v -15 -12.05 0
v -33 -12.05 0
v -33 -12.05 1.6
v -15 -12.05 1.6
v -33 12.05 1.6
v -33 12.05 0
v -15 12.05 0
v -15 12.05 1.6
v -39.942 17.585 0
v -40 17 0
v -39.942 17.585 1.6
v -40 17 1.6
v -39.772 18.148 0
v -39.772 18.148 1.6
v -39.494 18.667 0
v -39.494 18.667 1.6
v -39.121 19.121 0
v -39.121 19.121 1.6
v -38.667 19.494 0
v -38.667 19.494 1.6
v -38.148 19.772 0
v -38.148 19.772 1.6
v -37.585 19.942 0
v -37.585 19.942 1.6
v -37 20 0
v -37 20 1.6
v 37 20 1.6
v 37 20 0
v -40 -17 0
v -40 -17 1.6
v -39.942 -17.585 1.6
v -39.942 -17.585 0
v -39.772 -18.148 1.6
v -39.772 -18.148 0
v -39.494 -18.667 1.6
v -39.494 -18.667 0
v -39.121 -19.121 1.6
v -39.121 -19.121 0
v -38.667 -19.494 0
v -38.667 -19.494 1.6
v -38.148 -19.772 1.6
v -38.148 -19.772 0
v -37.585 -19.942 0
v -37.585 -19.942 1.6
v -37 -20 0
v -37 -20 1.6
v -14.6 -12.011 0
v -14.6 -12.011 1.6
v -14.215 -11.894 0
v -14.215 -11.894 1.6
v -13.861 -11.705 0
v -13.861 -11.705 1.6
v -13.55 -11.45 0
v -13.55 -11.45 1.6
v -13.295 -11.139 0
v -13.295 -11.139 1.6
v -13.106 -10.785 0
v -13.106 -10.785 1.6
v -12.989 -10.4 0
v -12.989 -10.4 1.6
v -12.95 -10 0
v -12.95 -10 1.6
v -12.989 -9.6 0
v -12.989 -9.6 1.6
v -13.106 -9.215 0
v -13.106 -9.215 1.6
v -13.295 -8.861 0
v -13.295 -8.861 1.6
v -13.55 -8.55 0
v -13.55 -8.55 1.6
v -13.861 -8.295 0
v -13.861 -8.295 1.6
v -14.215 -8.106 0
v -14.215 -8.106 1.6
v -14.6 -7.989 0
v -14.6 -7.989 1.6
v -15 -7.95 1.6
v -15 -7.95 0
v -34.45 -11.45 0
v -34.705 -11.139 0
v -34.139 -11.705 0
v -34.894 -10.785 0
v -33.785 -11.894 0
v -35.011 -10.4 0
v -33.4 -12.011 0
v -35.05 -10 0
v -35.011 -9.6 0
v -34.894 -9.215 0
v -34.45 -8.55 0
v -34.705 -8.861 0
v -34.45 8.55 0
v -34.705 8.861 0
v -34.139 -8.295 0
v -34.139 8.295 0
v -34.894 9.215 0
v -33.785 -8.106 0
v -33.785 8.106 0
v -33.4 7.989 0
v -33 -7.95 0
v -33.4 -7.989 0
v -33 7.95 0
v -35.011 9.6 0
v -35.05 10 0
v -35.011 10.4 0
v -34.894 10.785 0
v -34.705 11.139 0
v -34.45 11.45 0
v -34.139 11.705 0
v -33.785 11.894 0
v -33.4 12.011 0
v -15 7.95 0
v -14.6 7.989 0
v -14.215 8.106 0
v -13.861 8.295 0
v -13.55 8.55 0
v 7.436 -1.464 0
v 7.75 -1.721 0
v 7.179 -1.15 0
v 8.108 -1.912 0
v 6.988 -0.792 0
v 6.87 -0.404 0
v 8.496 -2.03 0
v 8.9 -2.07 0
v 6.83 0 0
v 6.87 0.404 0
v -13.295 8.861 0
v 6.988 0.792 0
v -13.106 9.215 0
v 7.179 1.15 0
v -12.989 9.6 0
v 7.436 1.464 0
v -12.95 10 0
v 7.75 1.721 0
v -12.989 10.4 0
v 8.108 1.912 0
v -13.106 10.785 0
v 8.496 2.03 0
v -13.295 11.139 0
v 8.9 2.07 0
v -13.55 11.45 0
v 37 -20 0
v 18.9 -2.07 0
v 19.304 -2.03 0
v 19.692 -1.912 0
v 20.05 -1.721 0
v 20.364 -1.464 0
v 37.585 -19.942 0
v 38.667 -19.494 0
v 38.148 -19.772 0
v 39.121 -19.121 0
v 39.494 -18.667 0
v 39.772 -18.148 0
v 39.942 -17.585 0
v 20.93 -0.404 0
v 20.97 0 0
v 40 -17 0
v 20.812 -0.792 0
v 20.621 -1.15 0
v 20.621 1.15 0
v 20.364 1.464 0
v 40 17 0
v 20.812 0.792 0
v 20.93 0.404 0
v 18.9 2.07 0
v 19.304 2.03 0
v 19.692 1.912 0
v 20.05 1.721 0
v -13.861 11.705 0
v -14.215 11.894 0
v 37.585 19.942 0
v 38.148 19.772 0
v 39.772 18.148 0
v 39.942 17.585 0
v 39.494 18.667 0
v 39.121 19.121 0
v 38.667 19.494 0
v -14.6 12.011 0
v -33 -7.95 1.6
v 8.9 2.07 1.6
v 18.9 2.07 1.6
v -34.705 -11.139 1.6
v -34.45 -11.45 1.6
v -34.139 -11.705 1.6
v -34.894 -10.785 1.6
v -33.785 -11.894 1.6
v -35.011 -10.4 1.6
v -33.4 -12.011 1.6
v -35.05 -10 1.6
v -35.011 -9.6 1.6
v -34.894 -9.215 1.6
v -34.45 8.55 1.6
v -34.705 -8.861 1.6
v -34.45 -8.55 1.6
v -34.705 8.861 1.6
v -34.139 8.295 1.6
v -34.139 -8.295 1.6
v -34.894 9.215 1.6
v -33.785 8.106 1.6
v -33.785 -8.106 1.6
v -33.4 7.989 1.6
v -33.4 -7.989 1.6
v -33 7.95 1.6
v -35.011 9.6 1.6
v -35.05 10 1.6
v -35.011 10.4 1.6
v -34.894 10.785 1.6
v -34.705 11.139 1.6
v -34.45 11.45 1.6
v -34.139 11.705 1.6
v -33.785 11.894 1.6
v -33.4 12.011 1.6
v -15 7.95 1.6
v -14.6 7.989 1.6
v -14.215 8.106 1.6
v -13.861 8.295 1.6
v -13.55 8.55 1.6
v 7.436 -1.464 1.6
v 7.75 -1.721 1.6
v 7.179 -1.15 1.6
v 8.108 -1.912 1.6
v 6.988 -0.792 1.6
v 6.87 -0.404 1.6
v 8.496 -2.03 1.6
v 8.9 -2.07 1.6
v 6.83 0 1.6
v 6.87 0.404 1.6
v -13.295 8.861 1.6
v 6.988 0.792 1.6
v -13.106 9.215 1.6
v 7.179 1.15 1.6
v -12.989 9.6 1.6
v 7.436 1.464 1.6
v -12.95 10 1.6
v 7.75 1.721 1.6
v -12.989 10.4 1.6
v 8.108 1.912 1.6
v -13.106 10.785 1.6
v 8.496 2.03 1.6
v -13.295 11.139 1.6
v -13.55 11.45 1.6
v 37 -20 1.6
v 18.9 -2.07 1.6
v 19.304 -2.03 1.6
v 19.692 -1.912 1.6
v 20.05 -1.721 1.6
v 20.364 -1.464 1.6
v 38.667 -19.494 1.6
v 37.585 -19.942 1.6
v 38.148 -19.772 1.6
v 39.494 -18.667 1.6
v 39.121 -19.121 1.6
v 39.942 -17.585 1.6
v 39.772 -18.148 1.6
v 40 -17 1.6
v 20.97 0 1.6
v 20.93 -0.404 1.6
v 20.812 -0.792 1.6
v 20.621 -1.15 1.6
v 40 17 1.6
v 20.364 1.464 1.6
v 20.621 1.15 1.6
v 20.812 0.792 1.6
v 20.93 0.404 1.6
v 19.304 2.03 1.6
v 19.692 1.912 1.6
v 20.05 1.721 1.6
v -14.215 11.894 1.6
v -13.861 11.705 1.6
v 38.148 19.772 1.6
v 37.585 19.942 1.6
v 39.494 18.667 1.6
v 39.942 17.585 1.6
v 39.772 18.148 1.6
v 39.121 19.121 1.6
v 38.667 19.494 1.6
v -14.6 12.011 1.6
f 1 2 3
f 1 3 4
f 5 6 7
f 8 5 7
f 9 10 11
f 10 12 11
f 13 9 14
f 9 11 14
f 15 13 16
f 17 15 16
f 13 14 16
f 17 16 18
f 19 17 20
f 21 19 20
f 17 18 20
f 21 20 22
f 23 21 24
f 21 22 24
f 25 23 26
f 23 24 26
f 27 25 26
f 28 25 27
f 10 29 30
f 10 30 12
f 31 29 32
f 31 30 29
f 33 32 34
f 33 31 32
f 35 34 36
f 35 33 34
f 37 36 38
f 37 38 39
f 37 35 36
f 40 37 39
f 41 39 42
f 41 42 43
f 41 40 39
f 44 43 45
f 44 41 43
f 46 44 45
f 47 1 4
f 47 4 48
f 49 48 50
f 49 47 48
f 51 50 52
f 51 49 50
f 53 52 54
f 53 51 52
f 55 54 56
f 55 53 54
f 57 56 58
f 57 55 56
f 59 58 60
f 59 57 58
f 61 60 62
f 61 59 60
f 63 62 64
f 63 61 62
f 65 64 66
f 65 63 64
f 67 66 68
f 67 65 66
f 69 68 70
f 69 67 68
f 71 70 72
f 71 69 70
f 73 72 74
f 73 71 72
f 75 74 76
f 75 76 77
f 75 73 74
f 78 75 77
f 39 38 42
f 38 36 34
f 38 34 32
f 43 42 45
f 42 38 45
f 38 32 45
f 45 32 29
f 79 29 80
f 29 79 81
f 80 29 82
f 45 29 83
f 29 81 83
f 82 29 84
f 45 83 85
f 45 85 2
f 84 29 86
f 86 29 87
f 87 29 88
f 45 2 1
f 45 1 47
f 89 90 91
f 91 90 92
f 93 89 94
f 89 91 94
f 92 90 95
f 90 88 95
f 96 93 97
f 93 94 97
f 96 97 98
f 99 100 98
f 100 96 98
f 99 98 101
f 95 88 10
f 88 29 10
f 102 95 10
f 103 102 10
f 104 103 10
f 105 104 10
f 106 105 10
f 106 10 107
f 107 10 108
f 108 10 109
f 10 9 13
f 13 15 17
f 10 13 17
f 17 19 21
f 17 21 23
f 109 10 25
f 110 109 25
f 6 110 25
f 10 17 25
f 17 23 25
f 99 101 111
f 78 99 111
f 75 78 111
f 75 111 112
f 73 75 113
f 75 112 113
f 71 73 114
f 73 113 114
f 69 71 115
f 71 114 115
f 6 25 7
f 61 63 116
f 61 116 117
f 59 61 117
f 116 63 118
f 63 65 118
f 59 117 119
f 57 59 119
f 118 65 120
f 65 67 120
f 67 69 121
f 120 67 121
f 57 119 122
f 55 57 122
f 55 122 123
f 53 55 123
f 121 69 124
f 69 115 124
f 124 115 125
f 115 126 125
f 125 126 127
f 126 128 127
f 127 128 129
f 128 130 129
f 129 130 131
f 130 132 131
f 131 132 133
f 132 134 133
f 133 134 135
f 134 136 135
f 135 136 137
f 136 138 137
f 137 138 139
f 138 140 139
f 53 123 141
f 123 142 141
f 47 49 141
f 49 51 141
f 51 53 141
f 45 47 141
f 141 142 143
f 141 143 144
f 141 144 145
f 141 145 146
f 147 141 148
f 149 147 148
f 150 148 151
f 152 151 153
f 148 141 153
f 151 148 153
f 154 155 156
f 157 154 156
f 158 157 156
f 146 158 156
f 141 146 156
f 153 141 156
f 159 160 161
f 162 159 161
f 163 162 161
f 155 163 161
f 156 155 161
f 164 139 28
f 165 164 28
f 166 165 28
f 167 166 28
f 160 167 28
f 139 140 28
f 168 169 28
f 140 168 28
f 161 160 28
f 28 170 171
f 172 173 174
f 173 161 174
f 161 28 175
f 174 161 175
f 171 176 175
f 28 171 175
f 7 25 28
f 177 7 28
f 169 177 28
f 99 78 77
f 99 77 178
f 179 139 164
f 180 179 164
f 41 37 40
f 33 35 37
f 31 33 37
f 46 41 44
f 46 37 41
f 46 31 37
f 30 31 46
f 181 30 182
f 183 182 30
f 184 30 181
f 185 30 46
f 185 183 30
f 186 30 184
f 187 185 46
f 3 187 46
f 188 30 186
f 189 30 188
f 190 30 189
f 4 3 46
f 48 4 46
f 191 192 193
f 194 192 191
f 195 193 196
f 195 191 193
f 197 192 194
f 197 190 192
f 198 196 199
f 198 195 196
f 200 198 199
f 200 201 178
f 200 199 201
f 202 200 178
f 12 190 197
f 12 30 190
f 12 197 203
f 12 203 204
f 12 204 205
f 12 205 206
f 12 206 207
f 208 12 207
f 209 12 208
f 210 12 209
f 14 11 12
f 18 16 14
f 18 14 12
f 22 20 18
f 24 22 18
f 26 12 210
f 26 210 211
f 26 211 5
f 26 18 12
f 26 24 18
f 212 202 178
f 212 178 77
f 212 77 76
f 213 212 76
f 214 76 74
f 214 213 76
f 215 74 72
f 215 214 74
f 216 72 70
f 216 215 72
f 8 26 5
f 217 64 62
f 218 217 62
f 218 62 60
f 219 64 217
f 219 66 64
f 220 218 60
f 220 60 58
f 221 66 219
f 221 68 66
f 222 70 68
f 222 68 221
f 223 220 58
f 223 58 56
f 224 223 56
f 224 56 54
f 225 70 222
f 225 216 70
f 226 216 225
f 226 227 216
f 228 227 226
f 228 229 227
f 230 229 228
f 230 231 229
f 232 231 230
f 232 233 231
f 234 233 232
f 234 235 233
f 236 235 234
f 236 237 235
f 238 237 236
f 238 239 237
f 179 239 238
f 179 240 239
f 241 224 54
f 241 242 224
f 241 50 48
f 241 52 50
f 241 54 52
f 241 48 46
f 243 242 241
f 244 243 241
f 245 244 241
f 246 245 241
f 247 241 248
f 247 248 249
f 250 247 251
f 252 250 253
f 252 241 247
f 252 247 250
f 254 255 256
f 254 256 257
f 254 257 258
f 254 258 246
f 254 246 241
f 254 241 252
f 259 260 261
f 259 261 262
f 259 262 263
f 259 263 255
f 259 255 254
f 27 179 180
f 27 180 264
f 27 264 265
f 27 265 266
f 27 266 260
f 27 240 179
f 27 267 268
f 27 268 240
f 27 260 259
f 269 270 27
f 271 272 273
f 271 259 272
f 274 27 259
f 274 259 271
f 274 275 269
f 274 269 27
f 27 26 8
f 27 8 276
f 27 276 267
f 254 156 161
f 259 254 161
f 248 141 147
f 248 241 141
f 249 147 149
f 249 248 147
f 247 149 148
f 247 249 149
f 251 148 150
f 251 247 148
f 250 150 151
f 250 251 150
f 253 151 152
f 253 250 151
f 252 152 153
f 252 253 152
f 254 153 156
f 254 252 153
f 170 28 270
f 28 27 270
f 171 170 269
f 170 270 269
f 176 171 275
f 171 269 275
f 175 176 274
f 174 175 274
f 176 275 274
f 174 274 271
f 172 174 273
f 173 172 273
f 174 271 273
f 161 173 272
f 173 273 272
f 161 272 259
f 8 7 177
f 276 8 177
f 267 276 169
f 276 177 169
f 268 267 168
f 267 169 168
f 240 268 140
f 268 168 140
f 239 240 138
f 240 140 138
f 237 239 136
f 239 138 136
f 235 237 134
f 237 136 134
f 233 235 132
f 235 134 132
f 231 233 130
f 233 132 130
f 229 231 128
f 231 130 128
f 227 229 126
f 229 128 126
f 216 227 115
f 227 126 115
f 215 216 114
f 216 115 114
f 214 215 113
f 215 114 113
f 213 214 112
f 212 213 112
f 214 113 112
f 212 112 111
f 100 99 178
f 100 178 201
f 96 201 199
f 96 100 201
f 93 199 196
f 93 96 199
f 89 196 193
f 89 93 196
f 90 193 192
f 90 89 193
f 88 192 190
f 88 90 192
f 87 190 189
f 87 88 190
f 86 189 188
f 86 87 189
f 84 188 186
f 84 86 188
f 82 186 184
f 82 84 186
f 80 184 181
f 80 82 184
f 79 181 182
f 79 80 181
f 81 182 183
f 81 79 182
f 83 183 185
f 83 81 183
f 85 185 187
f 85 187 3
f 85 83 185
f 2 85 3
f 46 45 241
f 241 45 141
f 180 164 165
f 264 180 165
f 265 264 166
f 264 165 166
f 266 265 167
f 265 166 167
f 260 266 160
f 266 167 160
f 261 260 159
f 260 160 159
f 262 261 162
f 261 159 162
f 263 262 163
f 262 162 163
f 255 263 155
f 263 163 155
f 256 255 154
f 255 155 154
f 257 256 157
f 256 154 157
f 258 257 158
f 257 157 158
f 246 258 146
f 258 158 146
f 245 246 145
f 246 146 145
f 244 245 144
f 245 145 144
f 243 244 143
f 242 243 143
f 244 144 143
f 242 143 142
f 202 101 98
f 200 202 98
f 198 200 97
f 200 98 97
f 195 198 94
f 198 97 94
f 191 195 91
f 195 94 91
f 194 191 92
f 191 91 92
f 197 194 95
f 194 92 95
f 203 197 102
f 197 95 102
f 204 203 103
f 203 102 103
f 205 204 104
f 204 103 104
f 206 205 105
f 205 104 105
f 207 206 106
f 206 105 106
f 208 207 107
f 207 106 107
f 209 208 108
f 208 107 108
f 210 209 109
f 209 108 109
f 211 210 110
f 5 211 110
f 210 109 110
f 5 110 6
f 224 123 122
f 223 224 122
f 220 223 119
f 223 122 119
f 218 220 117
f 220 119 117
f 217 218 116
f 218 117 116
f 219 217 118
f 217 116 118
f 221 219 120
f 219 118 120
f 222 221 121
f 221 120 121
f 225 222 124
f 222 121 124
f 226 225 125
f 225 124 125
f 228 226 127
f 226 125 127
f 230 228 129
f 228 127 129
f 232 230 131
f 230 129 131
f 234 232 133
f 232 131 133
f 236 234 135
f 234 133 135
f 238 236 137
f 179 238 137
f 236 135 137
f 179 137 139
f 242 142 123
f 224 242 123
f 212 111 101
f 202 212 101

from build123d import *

# Parameters (mm, degrees)
SKETCH1_W           = 80
SKETCH1_H           = 40
BOSS_EXTRUDE1_DEPTH = 1.6
FILLET1_R           = 3


with BuildPart() as part:
    # Sketch1 → Boss-Extrude1 (new body)
    with BuildSketch(Plane.XY):
        Rectangle(SKETCH1_W, SKETCH1_H)
        with BuildLine():
            Line((-15, 7.95), (-33, 7.95))
            ThreePointArc((-33, 7.95), (-35.05, 10), (-33, 12.05))
            Line((-33, 12.05), (-15, 12.05))
            ThreePointArc((-15, 12.05), (-12.95, 10), (-15, 7.95))
        make_face(mode=Mode.SUBTRACT)
        with BuildLine():
            Line((-15, -7.95), (-33, -7.95))
            ThreePointArc((-33, -7.95), (-35.05, -10), (-33, -12.05))
            Line((-33, -12.05), (-15, -12.05))
            ThreePointArc((-15, -12.05), (-12.95, -10), (-15, -7.95))
        make_face(mode=Mode.SUBTRACT)
        with BuildLine():
            Line((8.9, 2.07), (18.9, 2.07))
            ThreePointArc((18.9, 2.07), (20.97, 0), (18.9, -2.07))
            Line((18.9, -2.07), (8.9, -2.07))
            ThreePointArc((8.9, -2.07), (6.83, 0), (8.9, 2.07))
        make_face(mode=Mode.SUBTRACT)
    extrude(amount=BOSS_EXTRUDE1_DEPTH)

    # Fillet1
    fillet1_edges = [part.edges().sort_by_distance(p)[0] for p in [
        (40, -20, 0.8),
        (-40, -20, 0.8),
        (-40, 20, 0.8),
        (40, 20, 0.8),
    ]]
    fillet(fillet1_edges, radius=FILLET1_R)


solid = part.part
